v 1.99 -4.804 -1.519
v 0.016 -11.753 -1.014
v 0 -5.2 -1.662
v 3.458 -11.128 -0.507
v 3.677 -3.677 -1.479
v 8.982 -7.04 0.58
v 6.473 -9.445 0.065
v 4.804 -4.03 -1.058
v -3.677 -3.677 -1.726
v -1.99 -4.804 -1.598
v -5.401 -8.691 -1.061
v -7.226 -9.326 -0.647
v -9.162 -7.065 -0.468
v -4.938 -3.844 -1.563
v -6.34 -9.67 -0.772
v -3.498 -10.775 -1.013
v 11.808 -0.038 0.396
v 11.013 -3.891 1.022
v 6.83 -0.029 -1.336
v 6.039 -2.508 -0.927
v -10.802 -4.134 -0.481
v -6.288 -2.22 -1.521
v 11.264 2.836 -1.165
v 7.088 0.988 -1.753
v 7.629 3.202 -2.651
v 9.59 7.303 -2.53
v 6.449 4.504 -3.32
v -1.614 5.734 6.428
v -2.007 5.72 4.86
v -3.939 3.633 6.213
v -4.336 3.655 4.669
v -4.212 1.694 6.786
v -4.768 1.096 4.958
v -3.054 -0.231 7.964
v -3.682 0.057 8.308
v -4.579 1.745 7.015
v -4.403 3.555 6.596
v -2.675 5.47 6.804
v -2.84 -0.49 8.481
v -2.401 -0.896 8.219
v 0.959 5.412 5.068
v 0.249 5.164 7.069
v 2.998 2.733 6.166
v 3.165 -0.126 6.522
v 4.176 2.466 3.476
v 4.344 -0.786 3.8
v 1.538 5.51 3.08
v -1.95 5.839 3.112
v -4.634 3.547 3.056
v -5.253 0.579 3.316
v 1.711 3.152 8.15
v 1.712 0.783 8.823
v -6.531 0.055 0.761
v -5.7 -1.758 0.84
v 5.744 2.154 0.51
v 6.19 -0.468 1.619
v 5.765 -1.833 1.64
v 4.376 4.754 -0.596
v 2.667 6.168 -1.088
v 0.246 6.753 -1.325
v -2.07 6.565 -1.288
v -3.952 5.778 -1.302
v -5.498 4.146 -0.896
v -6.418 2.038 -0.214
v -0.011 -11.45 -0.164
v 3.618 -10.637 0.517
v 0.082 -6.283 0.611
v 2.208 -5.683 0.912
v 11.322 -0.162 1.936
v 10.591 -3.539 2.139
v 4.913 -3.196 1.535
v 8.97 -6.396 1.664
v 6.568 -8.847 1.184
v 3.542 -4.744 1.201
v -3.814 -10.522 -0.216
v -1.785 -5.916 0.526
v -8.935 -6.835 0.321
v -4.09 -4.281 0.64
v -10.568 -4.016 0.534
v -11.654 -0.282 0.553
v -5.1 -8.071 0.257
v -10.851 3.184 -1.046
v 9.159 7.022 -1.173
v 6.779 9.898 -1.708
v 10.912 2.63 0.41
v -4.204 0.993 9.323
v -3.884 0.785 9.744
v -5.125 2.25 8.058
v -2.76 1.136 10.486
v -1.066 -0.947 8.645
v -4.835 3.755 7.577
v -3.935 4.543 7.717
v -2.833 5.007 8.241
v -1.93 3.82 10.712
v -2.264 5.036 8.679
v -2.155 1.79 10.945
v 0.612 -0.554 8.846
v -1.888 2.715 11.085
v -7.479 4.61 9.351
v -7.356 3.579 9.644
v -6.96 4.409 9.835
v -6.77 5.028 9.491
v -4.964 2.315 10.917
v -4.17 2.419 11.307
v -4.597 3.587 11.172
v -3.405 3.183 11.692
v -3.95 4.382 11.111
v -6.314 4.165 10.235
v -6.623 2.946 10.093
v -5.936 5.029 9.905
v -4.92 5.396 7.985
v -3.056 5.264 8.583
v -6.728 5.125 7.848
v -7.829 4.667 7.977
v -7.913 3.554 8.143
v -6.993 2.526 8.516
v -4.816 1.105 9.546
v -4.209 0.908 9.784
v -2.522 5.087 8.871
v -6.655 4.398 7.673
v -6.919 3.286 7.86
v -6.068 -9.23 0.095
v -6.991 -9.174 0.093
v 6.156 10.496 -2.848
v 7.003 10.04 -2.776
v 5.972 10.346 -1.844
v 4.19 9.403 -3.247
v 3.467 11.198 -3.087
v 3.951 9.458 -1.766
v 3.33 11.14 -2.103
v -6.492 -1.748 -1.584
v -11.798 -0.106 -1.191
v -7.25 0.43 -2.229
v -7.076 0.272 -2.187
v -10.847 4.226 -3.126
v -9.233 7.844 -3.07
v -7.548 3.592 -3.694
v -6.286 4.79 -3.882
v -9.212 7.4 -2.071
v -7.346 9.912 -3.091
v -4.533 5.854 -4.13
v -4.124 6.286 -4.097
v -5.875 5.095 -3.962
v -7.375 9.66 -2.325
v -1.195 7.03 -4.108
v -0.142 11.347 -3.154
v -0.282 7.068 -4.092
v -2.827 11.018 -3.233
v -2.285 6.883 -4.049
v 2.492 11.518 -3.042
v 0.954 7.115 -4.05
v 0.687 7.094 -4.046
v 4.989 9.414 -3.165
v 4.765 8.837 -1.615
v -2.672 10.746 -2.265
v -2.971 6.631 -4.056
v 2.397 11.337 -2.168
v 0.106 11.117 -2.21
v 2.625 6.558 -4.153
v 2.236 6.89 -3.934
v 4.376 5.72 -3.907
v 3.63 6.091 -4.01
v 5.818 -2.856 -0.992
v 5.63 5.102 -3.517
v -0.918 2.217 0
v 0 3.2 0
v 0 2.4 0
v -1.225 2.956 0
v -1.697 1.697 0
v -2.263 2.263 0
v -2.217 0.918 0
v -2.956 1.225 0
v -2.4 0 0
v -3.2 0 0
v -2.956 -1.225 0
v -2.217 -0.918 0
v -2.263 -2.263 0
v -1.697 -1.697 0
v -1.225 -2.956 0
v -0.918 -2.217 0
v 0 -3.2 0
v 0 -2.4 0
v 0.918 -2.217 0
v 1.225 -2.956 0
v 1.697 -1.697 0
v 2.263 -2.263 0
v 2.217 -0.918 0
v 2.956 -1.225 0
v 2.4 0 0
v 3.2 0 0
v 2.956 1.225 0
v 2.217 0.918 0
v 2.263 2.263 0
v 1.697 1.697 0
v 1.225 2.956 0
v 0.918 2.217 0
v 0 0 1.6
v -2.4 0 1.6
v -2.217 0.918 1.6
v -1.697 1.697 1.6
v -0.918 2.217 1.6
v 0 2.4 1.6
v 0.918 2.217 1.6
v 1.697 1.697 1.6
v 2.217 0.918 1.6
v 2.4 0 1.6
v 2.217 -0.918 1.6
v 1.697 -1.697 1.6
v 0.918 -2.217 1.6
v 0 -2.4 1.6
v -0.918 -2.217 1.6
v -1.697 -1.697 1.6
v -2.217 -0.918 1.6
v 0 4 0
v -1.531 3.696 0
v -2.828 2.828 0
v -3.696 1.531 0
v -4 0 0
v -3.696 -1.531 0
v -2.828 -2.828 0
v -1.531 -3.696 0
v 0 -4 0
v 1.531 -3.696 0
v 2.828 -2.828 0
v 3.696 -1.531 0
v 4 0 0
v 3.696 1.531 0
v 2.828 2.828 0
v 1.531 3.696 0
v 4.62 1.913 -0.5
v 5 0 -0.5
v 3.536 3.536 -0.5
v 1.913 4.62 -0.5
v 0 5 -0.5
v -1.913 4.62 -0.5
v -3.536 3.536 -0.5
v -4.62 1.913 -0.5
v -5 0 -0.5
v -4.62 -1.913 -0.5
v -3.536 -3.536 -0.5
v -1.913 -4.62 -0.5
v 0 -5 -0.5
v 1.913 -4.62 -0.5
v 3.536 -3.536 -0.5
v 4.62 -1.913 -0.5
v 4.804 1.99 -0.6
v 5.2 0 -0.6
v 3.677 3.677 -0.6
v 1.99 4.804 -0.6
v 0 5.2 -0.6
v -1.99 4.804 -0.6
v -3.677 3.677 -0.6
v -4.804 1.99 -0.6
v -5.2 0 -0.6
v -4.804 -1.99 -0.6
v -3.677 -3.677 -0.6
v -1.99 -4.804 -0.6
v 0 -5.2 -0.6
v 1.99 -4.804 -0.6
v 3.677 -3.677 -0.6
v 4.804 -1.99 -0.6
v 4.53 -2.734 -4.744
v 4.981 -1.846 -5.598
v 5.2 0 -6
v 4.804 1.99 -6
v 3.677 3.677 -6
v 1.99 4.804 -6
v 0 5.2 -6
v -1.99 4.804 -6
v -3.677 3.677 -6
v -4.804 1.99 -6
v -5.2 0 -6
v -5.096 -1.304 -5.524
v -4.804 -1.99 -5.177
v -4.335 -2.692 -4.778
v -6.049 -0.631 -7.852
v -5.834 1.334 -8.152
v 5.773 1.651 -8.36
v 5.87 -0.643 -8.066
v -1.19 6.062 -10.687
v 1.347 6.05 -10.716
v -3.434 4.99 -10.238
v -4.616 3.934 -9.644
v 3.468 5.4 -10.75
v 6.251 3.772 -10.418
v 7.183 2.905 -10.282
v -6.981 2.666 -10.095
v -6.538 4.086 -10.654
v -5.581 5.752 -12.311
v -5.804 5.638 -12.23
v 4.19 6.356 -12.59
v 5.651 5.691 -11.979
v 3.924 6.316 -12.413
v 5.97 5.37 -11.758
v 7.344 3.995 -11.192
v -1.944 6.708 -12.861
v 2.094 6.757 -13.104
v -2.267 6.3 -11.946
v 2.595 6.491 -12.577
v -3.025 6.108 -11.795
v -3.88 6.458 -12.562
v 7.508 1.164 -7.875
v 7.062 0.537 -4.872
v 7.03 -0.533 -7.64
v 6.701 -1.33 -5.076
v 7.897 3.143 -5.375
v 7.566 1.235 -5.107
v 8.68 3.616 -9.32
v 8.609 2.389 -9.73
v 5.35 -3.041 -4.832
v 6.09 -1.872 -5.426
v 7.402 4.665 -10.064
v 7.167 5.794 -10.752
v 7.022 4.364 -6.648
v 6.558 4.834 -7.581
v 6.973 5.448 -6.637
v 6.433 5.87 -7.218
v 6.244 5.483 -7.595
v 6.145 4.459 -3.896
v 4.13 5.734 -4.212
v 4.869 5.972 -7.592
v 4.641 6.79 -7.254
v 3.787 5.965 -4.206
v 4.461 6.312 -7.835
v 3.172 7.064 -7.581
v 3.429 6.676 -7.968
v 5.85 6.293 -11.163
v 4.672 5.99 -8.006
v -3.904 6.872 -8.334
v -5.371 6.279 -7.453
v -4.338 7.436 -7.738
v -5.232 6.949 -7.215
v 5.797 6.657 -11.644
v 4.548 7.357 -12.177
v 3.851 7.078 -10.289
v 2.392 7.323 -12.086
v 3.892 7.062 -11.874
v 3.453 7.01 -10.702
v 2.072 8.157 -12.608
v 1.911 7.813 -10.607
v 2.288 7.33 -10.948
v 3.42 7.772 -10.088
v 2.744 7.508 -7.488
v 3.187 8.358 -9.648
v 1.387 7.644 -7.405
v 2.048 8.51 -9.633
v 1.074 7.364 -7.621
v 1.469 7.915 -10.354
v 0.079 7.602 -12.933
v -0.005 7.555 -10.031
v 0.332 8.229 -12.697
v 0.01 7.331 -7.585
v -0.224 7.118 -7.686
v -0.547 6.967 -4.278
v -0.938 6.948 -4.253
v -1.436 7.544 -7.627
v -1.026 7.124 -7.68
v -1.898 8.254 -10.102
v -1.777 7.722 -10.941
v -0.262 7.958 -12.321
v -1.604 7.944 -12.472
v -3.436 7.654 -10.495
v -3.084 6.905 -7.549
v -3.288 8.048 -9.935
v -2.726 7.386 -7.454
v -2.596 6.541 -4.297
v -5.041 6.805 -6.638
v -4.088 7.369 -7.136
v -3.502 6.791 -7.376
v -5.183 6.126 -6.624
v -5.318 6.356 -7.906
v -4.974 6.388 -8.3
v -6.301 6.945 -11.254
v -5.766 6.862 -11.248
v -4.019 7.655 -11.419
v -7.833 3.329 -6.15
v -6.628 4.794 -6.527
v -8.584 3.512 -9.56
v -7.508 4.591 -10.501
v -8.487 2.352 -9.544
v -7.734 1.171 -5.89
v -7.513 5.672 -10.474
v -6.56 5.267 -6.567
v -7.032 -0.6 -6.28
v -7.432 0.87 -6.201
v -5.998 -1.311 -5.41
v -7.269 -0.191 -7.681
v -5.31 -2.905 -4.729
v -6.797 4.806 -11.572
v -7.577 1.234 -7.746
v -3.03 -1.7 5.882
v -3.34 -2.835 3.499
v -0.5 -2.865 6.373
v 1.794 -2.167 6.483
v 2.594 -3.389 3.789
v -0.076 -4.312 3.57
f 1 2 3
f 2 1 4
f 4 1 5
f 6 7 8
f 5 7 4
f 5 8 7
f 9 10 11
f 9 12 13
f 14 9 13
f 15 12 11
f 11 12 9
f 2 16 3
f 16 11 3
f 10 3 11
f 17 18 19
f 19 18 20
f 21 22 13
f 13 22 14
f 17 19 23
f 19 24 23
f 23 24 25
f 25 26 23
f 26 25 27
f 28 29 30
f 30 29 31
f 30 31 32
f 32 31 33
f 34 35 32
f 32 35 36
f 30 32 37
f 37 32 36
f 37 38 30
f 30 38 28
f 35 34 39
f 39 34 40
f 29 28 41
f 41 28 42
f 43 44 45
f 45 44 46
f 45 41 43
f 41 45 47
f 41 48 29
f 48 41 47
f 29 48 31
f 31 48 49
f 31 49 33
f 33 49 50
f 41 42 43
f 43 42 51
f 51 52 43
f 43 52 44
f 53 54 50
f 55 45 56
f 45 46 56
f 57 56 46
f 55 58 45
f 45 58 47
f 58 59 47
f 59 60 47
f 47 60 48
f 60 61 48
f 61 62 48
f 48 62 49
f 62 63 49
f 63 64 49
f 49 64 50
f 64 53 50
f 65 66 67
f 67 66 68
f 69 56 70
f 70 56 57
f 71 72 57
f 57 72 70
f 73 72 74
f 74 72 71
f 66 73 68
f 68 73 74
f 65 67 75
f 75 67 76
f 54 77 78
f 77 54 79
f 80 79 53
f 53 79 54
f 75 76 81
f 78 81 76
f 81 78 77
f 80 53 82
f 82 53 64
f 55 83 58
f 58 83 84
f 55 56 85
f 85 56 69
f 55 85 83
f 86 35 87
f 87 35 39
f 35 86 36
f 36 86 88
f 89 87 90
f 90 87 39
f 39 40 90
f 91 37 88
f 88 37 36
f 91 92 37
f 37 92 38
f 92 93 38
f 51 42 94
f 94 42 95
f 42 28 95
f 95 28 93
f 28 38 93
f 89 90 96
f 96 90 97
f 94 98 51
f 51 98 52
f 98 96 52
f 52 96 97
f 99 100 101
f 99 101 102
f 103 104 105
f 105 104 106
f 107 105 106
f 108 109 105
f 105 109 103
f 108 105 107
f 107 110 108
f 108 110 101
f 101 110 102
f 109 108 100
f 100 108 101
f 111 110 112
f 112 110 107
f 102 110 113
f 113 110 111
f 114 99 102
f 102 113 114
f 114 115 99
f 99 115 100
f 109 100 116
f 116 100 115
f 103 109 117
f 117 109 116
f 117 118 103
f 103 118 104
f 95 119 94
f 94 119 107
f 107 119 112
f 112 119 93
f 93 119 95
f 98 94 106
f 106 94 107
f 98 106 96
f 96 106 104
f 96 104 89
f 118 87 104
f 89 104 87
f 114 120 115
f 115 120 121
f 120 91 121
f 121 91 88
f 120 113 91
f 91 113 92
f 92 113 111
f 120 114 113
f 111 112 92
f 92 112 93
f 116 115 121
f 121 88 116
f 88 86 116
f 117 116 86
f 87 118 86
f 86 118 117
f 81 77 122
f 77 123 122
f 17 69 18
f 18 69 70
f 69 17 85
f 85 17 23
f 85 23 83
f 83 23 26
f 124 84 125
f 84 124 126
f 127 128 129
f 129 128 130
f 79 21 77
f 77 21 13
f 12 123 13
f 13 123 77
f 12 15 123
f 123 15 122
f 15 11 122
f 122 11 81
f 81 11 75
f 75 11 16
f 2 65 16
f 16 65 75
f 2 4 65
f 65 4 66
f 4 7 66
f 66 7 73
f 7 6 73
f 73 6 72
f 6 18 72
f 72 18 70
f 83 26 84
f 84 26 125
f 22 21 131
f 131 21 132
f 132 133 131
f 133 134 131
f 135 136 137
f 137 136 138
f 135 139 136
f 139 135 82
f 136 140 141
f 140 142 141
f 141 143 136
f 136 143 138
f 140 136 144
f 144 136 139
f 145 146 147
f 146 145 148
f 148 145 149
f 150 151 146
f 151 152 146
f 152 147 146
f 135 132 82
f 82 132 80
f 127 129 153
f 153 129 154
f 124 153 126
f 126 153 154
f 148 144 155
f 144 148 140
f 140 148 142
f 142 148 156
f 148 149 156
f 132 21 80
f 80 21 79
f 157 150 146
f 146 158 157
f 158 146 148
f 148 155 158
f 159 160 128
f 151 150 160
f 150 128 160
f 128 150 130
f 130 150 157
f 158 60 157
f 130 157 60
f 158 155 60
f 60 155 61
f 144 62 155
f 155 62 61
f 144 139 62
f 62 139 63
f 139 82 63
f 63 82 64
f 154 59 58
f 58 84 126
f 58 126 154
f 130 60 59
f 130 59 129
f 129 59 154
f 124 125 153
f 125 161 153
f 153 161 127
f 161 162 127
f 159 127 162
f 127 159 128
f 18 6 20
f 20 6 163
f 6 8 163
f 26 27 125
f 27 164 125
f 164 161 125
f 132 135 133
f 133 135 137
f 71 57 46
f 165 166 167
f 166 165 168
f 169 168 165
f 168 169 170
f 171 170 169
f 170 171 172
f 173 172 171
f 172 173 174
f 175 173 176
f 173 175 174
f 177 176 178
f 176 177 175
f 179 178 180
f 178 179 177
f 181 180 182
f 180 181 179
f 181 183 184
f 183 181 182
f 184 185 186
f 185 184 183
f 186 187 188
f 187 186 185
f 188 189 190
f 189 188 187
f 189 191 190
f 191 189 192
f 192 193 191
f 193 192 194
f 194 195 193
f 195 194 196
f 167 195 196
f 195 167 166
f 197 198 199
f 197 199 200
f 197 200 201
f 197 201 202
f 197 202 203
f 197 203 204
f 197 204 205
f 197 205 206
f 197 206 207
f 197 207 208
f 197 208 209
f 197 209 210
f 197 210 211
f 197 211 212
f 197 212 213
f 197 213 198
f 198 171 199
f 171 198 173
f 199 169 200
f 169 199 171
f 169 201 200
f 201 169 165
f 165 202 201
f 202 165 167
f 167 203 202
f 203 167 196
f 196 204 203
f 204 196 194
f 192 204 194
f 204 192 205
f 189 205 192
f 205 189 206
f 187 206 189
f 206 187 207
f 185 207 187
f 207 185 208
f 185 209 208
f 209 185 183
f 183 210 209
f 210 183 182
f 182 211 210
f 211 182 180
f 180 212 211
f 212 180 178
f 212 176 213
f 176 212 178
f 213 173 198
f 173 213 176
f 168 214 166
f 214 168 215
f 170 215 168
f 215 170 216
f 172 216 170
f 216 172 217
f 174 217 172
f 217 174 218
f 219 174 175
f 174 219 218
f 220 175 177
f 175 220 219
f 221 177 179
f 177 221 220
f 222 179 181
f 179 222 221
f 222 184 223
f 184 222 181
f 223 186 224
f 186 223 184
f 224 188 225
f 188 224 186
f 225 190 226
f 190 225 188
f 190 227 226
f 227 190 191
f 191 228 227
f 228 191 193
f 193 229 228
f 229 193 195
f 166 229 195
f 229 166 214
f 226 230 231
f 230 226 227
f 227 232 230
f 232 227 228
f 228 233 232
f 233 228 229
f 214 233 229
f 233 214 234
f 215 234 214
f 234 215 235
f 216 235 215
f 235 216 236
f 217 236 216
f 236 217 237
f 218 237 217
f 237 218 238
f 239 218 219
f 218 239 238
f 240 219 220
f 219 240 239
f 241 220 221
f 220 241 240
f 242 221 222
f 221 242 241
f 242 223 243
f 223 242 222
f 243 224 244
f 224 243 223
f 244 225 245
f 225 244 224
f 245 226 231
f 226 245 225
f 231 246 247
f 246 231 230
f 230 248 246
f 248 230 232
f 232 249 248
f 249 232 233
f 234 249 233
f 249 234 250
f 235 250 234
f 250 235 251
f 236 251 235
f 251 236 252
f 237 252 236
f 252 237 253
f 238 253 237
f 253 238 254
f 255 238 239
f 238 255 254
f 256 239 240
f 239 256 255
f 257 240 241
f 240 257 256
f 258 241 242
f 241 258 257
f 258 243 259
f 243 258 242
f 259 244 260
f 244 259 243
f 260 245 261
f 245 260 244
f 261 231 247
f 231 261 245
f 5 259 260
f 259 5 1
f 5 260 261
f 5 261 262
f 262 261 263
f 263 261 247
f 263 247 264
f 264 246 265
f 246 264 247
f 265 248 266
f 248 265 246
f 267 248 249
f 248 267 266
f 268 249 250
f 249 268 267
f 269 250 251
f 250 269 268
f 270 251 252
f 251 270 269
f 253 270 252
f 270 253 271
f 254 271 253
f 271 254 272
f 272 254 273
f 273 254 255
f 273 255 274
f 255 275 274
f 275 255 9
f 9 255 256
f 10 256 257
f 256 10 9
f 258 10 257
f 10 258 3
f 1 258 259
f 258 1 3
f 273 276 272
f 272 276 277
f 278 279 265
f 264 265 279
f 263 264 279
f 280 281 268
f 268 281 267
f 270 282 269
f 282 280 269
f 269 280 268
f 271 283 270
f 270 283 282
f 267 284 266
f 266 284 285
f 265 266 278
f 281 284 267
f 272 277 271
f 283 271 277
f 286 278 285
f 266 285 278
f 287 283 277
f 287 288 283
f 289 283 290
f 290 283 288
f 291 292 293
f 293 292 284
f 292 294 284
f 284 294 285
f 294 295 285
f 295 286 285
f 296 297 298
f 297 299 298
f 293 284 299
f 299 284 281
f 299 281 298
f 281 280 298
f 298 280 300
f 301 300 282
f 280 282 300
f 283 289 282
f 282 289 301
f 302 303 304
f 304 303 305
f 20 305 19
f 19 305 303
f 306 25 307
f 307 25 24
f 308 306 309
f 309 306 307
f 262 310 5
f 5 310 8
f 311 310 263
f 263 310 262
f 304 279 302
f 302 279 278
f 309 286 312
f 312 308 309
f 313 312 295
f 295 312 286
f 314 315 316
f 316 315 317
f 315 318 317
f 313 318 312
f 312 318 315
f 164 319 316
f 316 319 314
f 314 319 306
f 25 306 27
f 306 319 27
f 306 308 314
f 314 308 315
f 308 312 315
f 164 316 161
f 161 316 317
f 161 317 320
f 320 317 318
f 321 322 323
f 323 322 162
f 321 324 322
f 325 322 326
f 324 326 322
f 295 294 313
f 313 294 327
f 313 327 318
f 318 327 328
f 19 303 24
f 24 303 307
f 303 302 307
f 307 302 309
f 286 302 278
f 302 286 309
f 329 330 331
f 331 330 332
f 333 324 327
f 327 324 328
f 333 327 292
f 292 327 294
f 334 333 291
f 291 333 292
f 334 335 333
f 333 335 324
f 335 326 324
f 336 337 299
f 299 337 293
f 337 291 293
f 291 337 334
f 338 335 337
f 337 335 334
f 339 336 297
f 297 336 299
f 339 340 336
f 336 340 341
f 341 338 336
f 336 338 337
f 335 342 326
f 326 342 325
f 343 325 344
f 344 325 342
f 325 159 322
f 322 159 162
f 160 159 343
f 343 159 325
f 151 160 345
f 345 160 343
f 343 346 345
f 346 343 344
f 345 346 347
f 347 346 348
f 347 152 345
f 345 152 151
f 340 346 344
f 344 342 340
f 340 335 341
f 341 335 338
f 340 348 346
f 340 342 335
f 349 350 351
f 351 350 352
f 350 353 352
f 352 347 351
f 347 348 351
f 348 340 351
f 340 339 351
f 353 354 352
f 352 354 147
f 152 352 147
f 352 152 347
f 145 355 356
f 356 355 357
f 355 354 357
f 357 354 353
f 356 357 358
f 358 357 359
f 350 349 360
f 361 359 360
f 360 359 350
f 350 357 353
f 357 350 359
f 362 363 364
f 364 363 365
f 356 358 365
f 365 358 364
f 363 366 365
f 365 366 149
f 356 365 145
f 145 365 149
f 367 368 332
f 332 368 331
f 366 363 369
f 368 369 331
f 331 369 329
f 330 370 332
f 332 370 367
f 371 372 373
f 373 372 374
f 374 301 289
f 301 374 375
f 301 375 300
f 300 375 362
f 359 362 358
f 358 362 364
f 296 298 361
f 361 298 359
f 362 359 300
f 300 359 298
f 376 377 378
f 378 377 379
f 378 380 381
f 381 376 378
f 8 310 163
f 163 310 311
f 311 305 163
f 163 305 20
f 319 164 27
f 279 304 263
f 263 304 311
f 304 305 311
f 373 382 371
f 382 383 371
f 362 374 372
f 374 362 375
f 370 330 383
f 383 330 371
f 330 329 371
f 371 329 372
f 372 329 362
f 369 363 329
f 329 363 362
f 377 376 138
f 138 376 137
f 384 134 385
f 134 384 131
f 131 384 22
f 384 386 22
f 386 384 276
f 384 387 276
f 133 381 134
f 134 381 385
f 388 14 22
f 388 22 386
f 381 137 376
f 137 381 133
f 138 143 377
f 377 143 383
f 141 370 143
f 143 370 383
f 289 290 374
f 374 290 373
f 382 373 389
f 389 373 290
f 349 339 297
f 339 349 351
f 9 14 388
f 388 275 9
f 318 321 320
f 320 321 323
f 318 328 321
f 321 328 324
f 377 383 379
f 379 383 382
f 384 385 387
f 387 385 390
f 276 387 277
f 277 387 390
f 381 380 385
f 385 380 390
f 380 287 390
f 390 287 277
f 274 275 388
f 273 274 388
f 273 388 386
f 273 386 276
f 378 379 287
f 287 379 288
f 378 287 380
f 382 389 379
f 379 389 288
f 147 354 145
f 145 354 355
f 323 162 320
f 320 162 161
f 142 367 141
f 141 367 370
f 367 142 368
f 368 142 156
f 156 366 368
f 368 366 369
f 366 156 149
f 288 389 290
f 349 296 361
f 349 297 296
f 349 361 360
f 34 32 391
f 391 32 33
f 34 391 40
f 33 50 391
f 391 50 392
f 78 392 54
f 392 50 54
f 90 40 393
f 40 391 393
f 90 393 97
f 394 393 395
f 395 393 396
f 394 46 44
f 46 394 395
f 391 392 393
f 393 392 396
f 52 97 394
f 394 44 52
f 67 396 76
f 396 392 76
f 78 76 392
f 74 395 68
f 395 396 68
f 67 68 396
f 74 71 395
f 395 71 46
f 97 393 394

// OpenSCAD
use <../lib.scad>
use <s/20606s01.scad>
use <s/20606s02.scad>
use <s/20606s03.scad>
function ldraw_lib__20606p01() = [
// 0 Minifig Hair Mid-Length Scraggly with Dual Mould Black Floppy Witch Hat
// 0 Name: 20606p01.dat
// 0 Author: Lisa Winter [LisaWinter]
// 0 !LDRAW_ORG Part UPDATE 2026-07
// 0 !LICENSE Licensed under CC BY 4.0 : see CAreadme.txt
// 
// 0 BFC CERTIFY CCW
  [0,"BFC","CERTIFY"],
  [0,"BFC","CCW"],
// 
// 0 !CATEGORY Minifig Headwear
// 0 !KEYWORDS BAM, Bricklink 20606pb07, Brickowl 584063, Build-A-Minifigure
// 0 !KEYWORDS Colour Combination, Halloween, Rebrickable 20606pr0006
// 
// 0 !HISTORY 2026-07-30 [OrionP] Official Update 2026-07
// 
// 0 // Hat
// 1 0 0 0 0 1 0 0 0 1 0 0 0 1 s\20606s01.dat
  [1,0,0,0,0,1,0,0,0,1,0,0,0,1, ldraw_lib__s__20606s01()],
// 0 // Hair
// 1 16 0 0 0 1 0 0 0 1 0 0 0 1 s\20606s02.dat
  [1,16,0,0,0,1,0,0,0,1,0,0,0,1, ldraw_lib__s__20606s02()],
// 0 // Patternable area
// 1 0 0 0 0 1 0 0 0 1 0 0 0 1 s\20606s03.dat
  [1,0,0,0,0,1,0,0,0,1,0,0,0,1, ldraw_lib__s__20606s03()],
];
module ldraw_lib__20606p01(step=0, col=false, unit=2/5, alt=false, line=0.2, solid=!$preview)
    makepoly(ldraw_lib__20606p01(), step=step, col=col, unit=unit, alt=alt, line=line, solid=solid);
ldraw_lib__20606p01(line=0.2);
